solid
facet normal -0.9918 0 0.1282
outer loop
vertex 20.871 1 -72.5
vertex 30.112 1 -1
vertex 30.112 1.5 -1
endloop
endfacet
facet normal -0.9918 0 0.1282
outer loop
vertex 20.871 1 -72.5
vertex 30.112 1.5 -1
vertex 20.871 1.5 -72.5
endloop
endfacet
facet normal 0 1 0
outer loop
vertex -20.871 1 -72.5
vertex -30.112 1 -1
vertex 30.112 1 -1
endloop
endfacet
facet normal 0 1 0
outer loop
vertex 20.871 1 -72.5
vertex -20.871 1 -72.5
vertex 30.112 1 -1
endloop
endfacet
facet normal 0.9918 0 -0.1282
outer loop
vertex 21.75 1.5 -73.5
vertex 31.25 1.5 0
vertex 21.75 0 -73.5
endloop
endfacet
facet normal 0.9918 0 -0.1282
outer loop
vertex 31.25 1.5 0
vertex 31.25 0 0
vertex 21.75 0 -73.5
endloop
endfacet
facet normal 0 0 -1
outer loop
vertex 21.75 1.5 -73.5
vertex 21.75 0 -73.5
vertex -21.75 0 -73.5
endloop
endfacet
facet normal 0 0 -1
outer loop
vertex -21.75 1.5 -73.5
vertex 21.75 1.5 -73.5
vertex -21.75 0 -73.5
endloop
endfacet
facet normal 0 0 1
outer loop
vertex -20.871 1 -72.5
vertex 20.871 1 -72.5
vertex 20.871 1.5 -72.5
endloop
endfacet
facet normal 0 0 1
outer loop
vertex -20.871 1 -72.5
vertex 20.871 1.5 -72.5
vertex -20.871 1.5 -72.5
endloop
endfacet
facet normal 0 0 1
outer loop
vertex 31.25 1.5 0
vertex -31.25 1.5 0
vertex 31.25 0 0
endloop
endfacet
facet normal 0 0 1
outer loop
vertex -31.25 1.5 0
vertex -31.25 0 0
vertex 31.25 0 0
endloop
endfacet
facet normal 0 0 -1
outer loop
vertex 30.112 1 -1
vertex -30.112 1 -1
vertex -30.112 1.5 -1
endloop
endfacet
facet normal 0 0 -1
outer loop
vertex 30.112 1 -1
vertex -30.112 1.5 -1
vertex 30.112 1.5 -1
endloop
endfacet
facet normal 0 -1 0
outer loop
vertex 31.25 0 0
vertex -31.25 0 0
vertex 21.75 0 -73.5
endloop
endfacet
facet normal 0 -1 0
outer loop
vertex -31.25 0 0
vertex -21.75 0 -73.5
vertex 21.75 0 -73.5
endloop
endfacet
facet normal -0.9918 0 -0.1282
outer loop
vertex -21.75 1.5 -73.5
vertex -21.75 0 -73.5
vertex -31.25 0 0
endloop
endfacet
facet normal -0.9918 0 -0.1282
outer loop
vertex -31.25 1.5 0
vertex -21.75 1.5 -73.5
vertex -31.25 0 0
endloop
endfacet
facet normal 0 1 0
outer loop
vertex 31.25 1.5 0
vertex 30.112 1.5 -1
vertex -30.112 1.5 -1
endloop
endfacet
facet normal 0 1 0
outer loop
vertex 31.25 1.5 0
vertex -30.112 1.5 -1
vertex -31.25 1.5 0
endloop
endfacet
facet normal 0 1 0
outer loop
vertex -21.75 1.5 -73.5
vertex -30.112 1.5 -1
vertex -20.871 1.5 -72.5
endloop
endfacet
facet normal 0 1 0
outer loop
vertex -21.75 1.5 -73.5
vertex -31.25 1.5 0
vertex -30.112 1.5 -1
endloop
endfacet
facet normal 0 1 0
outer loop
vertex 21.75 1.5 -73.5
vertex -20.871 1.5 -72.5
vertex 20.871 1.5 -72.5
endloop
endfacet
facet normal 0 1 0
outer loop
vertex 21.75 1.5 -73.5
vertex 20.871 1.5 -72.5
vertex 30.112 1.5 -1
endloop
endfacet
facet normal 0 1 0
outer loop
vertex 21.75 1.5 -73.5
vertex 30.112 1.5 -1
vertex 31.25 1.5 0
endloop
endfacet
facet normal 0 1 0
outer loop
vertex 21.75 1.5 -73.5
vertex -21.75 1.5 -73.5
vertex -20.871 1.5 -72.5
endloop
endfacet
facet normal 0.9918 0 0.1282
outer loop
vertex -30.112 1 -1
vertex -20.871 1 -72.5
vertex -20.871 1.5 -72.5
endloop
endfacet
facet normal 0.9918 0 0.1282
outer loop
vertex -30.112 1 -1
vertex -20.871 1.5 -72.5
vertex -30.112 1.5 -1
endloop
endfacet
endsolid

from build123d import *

# Parameters (mm, degrees)
EXTRUDE_1_DEPTH = 1
EXTRUDE_2_DEPTH = 0.5


with BuildPart() as part:
    # 草图1 → 凸台-拉伸1 (new body)
    with BuildSketch(Plane(origin=(0, 0, 0), x_dir=(1, 0, 0), z_dir=(0, 1, 0))):
        Polygon((-31.25, 0), (31.25, 0), (21.75, 73.5), (-21.75, 73.5), align=None)
    extrude(amount=EXTRUDE_1_DEPTH)

    # 草图2 → 凸台-拉伸2 (add)
    with BuildSketch(Plane(origin=(0, 1, 0), x_dir=(1, 0, 0), z_dir=(0, 1, 0))):
        Polygon((-21.75, 73.5), (-31.25, 0), (31.25, 0), (21.75, 73.5), align=None)
        Polygon((-20.870933298, 72.5), (-30.112429896, 1), (30.112429896, 1), (20.870933298, 72.5), align=None, mode=Mode.SUBTRACT)
    extrude(amount=EXTRUDE_2_DEPTH)


solid = part.part
